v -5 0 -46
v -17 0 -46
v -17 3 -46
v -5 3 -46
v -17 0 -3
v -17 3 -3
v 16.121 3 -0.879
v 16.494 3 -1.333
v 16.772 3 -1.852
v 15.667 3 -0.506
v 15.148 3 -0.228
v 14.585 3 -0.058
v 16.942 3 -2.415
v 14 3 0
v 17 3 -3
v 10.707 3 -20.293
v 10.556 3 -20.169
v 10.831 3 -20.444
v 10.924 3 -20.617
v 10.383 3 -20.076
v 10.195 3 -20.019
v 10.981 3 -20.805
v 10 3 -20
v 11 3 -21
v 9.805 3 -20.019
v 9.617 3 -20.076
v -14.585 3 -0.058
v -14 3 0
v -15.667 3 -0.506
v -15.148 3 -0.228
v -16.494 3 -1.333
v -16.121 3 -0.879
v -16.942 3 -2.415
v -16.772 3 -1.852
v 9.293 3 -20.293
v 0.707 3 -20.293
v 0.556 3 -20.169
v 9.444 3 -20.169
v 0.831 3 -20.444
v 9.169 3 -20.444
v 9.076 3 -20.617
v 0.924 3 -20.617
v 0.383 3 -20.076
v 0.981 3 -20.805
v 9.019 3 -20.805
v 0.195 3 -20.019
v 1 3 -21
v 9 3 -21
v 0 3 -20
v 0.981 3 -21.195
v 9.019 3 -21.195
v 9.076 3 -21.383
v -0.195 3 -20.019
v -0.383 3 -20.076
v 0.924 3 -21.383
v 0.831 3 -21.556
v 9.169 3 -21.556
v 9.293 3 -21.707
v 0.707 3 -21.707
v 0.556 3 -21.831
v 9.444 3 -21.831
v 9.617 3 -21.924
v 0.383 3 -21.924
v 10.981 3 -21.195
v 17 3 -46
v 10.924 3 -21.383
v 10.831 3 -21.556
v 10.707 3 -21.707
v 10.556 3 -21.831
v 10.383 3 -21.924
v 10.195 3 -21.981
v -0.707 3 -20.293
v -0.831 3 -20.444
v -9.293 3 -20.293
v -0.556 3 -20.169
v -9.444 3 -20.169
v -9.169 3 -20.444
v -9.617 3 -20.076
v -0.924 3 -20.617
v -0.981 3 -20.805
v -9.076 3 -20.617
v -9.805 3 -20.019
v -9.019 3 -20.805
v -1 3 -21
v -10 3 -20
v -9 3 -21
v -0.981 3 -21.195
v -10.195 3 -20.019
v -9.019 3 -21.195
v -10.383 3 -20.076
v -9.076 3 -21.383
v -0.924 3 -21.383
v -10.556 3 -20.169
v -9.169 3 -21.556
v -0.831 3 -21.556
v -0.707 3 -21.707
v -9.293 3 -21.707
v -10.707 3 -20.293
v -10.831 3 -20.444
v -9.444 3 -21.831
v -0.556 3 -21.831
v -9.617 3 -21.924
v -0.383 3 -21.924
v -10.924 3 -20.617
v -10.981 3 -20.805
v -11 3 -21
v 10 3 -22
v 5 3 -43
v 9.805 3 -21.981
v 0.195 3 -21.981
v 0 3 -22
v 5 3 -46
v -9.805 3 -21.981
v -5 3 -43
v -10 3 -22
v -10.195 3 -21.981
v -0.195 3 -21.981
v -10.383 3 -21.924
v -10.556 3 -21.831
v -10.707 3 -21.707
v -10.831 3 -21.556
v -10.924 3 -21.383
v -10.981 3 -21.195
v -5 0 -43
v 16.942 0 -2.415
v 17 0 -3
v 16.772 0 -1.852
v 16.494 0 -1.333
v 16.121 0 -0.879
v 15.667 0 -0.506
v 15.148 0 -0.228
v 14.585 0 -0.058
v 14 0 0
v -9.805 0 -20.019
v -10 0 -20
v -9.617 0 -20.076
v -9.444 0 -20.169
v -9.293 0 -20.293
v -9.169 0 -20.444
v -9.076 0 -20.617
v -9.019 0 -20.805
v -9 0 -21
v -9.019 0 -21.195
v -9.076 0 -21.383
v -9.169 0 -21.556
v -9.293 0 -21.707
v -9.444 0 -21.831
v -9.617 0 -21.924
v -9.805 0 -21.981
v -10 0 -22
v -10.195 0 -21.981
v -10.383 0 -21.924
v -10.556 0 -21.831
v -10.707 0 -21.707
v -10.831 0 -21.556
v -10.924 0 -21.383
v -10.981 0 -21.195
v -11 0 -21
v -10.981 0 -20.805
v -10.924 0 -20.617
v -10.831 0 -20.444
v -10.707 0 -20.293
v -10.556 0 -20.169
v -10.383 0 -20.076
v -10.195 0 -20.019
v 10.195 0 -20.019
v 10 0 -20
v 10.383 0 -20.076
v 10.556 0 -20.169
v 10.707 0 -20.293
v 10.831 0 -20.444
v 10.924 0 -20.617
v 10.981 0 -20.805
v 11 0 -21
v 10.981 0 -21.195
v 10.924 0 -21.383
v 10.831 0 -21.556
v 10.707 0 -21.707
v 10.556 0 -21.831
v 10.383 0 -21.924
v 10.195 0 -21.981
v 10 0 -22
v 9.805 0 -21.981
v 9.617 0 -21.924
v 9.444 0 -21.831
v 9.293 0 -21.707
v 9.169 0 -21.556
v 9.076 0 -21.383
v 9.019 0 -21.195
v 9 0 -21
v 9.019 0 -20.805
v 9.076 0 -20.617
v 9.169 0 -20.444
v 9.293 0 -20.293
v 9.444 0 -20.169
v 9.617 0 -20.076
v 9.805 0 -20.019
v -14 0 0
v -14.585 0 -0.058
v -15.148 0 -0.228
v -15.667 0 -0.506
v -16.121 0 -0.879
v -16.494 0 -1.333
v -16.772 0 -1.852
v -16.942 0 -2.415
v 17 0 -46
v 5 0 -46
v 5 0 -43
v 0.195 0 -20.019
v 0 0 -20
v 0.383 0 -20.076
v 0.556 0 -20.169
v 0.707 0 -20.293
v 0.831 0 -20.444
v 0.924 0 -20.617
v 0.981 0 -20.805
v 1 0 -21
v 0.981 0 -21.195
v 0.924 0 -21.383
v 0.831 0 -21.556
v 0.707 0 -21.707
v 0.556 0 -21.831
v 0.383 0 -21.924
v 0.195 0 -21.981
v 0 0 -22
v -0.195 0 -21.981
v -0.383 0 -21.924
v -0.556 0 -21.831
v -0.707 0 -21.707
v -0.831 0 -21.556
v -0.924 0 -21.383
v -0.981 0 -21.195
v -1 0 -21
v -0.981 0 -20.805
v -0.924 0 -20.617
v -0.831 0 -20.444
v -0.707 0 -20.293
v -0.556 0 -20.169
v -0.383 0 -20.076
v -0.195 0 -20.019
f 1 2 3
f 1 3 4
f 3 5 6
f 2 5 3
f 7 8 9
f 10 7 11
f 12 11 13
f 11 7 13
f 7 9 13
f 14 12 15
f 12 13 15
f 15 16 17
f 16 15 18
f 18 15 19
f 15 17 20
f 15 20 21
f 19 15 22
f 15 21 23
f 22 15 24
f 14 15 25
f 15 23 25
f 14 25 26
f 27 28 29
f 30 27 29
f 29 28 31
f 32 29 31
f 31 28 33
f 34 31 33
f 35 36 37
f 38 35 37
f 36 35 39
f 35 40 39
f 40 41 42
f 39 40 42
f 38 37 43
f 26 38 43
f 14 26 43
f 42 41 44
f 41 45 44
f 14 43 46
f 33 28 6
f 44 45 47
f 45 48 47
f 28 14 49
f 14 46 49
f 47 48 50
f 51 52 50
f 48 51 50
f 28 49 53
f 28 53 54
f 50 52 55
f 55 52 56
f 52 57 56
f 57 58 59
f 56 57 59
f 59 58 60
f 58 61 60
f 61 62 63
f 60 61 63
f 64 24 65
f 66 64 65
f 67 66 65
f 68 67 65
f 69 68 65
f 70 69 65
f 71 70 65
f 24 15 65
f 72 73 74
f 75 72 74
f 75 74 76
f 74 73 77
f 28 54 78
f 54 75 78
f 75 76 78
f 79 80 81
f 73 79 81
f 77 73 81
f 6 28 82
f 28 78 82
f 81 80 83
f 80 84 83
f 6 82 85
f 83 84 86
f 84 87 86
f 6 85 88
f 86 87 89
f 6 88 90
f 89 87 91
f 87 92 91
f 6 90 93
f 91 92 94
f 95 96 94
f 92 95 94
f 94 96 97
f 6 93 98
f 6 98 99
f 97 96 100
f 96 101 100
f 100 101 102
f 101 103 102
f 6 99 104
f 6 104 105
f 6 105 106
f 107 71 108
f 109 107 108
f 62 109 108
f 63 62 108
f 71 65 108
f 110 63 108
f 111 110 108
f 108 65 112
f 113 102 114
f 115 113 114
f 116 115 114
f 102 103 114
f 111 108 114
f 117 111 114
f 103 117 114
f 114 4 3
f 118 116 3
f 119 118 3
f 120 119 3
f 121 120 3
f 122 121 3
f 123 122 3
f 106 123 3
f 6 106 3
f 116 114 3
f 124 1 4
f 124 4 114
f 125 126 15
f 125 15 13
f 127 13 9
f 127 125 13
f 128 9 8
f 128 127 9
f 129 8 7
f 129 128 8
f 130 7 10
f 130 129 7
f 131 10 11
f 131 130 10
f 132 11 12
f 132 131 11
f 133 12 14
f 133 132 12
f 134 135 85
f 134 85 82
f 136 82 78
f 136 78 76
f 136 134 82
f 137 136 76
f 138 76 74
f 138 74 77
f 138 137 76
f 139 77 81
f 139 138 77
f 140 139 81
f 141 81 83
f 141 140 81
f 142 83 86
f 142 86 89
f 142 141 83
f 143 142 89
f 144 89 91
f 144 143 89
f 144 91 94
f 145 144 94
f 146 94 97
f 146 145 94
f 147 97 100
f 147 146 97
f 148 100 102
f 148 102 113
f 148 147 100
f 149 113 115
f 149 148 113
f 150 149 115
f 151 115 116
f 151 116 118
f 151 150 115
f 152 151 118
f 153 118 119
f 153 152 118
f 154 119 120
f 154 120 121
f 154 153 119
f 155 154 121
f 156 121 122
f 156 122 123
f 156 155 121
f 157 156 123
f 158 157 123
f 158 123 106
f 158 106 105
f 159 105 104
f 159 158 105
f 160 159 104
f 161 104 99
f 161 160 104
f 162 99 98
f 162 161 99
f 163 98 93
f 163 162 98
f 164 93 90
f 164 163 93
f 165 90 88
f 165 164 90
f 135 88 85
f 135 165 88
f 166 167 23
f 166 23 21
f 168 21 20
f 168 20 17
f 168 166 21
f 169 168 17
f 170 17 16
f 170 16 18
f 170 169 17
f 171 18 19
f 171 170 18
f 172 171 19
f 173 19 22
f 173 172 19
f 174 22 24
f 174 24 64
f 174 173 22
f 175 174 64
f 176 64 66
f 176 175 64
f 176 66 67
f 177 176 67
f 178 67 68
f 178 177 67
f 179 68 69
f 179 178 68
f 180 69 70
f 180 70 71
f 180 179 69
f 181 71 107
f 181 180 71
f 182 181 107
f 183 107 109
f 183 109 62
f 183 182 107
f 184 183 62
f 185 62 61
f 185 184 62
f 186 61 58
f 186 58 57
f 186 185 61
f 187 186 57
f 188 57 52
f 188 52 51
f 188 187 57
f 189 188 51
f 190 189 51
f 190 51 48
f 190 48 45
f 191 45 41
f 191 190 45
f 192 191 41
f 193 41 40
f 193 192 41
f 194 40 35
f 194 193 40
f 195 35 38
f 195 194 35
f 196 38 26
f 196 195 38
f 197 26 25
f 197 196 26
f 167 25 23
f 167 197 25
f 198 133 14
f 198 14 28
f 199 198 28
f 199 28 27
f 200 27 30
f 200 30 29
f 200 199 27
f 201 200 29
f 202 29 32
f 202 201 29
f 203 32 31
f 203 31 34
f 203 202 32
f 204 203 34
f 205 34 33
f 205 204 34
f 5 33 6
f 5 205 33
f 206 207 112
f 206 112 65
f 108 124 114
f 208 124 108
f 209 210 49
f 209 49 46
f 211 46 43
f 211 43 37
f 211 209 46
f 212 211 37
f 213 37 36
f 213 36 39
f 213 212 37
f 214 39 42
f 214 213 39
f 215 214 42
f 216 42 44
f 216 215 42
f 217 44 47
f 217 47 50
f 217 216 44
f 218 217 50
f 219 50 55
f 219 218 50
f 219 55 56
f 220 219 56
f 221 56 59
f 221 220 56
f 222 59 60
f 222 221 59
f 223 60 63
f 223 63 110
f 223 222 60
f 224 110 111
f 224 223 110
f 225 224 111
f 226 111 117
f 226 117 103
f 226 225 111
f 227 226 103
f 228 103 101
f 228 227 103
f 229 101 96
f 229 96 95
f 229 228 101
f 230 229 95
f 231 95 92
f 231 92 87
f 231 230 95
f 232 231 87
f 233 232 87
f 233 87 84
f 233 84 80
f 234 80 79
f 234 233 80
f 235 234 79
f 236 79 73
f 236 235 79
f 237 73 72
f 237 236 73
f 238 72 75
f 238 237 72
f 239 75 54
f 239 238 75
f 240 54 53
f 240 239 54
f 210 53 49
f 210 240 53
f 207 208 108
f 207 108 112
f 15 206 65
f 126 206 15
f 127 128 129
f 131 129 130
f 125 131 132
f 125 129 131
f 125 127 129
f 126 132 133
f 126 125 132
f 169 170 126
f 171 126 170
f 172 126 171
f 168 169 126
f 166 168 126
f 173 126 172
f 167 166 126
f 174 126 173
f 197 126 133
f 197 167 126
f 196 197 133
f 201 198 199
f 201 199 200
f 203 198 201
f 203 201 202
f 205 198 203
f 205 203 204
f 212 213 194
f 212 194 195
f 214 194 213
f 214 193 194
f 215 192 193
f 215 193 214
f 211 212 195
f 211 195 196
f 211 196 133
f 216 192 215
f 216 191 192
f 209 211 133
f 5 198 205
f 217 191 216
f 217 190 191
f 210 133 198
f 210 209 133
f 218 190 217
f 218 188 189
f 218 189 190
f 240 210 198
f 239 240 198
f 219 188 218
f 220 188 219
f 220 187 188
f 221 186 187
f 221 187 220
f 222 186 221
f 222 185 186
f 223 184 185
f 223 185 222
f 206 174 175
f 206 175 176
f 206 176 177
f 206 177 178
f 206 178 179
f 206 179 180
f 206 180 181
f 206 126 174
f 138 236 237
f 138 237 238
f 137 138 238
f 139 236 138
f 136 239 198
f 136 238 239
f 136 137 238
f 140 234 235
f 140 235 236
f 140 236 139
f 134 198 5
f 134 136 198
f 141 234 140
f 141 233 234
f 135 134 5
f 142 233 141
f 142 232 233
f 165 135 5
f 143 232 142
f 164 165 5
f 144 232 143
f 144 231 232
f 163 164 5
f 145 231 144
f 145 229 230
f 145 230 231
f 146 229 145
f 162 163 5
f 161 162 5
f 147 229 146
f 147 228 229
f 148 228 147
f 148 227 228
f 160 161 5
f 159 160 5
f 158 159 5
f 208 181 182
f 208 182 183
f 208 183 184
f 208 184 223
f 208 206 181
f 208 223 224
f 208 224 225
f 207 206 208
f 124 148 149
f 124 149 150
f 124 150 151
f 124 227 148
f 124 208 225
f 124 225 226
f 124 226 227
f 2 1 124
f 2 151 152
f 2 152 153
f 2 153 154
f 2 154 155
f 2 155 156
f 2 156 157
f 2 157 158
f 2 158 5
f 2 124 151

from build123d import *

# Parameters (mm, degrees)
ESQUISSE1_R        = 1
BOSS_EXTRU_1_DEPTH = 3


with BuildPart() as part:
    # Esquisse1 → Boss.-Extru.1 (new body)
    with BuildSketch(Plane(origin=(0, 0, 0), x_dir=(1, 0, 0), z_dir=(0, 1, 0))):
        with BuildLine():
            Line((-5, 46), (-5, 43))
            Line((-5, 43), (5, 43))
            Line((5, 43), (5, 46))
            Line((5, 46), (17, 46))
            Line((17, 46), (17, 3))
            ThreePointArc((17, 3), (16.121320344, 0.878679656), (14, 0))
            Line((14, 0), (-14, 0))
            ThreePointArc((-14, 0), (-16.121320344, 0.878679656), (-17, 3))
            Line((-17, 3), (-17, 46))
            Line((-17, 46), (-5, 46))
        make_face()
        with Locations(Location((0, 21, 0), (0, 0, 270))):
            Circle(ESQUISSE1_R, mode=Mode.SUBTRACT)
        with Locations(Location((-10, 21, 0), (0, 0, 270))):
            Circle(ESQUISSE1_R, mode=Mode.SUBTRACT)
        with Locations(Location((10, 21, 0), (0, 0, 270))):
            Circle(ESQUISSE1_R, mode=Mode.SUBTRACT)
    extrude(amount=BOSS_EXTRU_1_DEPTH)


solid = part.part
